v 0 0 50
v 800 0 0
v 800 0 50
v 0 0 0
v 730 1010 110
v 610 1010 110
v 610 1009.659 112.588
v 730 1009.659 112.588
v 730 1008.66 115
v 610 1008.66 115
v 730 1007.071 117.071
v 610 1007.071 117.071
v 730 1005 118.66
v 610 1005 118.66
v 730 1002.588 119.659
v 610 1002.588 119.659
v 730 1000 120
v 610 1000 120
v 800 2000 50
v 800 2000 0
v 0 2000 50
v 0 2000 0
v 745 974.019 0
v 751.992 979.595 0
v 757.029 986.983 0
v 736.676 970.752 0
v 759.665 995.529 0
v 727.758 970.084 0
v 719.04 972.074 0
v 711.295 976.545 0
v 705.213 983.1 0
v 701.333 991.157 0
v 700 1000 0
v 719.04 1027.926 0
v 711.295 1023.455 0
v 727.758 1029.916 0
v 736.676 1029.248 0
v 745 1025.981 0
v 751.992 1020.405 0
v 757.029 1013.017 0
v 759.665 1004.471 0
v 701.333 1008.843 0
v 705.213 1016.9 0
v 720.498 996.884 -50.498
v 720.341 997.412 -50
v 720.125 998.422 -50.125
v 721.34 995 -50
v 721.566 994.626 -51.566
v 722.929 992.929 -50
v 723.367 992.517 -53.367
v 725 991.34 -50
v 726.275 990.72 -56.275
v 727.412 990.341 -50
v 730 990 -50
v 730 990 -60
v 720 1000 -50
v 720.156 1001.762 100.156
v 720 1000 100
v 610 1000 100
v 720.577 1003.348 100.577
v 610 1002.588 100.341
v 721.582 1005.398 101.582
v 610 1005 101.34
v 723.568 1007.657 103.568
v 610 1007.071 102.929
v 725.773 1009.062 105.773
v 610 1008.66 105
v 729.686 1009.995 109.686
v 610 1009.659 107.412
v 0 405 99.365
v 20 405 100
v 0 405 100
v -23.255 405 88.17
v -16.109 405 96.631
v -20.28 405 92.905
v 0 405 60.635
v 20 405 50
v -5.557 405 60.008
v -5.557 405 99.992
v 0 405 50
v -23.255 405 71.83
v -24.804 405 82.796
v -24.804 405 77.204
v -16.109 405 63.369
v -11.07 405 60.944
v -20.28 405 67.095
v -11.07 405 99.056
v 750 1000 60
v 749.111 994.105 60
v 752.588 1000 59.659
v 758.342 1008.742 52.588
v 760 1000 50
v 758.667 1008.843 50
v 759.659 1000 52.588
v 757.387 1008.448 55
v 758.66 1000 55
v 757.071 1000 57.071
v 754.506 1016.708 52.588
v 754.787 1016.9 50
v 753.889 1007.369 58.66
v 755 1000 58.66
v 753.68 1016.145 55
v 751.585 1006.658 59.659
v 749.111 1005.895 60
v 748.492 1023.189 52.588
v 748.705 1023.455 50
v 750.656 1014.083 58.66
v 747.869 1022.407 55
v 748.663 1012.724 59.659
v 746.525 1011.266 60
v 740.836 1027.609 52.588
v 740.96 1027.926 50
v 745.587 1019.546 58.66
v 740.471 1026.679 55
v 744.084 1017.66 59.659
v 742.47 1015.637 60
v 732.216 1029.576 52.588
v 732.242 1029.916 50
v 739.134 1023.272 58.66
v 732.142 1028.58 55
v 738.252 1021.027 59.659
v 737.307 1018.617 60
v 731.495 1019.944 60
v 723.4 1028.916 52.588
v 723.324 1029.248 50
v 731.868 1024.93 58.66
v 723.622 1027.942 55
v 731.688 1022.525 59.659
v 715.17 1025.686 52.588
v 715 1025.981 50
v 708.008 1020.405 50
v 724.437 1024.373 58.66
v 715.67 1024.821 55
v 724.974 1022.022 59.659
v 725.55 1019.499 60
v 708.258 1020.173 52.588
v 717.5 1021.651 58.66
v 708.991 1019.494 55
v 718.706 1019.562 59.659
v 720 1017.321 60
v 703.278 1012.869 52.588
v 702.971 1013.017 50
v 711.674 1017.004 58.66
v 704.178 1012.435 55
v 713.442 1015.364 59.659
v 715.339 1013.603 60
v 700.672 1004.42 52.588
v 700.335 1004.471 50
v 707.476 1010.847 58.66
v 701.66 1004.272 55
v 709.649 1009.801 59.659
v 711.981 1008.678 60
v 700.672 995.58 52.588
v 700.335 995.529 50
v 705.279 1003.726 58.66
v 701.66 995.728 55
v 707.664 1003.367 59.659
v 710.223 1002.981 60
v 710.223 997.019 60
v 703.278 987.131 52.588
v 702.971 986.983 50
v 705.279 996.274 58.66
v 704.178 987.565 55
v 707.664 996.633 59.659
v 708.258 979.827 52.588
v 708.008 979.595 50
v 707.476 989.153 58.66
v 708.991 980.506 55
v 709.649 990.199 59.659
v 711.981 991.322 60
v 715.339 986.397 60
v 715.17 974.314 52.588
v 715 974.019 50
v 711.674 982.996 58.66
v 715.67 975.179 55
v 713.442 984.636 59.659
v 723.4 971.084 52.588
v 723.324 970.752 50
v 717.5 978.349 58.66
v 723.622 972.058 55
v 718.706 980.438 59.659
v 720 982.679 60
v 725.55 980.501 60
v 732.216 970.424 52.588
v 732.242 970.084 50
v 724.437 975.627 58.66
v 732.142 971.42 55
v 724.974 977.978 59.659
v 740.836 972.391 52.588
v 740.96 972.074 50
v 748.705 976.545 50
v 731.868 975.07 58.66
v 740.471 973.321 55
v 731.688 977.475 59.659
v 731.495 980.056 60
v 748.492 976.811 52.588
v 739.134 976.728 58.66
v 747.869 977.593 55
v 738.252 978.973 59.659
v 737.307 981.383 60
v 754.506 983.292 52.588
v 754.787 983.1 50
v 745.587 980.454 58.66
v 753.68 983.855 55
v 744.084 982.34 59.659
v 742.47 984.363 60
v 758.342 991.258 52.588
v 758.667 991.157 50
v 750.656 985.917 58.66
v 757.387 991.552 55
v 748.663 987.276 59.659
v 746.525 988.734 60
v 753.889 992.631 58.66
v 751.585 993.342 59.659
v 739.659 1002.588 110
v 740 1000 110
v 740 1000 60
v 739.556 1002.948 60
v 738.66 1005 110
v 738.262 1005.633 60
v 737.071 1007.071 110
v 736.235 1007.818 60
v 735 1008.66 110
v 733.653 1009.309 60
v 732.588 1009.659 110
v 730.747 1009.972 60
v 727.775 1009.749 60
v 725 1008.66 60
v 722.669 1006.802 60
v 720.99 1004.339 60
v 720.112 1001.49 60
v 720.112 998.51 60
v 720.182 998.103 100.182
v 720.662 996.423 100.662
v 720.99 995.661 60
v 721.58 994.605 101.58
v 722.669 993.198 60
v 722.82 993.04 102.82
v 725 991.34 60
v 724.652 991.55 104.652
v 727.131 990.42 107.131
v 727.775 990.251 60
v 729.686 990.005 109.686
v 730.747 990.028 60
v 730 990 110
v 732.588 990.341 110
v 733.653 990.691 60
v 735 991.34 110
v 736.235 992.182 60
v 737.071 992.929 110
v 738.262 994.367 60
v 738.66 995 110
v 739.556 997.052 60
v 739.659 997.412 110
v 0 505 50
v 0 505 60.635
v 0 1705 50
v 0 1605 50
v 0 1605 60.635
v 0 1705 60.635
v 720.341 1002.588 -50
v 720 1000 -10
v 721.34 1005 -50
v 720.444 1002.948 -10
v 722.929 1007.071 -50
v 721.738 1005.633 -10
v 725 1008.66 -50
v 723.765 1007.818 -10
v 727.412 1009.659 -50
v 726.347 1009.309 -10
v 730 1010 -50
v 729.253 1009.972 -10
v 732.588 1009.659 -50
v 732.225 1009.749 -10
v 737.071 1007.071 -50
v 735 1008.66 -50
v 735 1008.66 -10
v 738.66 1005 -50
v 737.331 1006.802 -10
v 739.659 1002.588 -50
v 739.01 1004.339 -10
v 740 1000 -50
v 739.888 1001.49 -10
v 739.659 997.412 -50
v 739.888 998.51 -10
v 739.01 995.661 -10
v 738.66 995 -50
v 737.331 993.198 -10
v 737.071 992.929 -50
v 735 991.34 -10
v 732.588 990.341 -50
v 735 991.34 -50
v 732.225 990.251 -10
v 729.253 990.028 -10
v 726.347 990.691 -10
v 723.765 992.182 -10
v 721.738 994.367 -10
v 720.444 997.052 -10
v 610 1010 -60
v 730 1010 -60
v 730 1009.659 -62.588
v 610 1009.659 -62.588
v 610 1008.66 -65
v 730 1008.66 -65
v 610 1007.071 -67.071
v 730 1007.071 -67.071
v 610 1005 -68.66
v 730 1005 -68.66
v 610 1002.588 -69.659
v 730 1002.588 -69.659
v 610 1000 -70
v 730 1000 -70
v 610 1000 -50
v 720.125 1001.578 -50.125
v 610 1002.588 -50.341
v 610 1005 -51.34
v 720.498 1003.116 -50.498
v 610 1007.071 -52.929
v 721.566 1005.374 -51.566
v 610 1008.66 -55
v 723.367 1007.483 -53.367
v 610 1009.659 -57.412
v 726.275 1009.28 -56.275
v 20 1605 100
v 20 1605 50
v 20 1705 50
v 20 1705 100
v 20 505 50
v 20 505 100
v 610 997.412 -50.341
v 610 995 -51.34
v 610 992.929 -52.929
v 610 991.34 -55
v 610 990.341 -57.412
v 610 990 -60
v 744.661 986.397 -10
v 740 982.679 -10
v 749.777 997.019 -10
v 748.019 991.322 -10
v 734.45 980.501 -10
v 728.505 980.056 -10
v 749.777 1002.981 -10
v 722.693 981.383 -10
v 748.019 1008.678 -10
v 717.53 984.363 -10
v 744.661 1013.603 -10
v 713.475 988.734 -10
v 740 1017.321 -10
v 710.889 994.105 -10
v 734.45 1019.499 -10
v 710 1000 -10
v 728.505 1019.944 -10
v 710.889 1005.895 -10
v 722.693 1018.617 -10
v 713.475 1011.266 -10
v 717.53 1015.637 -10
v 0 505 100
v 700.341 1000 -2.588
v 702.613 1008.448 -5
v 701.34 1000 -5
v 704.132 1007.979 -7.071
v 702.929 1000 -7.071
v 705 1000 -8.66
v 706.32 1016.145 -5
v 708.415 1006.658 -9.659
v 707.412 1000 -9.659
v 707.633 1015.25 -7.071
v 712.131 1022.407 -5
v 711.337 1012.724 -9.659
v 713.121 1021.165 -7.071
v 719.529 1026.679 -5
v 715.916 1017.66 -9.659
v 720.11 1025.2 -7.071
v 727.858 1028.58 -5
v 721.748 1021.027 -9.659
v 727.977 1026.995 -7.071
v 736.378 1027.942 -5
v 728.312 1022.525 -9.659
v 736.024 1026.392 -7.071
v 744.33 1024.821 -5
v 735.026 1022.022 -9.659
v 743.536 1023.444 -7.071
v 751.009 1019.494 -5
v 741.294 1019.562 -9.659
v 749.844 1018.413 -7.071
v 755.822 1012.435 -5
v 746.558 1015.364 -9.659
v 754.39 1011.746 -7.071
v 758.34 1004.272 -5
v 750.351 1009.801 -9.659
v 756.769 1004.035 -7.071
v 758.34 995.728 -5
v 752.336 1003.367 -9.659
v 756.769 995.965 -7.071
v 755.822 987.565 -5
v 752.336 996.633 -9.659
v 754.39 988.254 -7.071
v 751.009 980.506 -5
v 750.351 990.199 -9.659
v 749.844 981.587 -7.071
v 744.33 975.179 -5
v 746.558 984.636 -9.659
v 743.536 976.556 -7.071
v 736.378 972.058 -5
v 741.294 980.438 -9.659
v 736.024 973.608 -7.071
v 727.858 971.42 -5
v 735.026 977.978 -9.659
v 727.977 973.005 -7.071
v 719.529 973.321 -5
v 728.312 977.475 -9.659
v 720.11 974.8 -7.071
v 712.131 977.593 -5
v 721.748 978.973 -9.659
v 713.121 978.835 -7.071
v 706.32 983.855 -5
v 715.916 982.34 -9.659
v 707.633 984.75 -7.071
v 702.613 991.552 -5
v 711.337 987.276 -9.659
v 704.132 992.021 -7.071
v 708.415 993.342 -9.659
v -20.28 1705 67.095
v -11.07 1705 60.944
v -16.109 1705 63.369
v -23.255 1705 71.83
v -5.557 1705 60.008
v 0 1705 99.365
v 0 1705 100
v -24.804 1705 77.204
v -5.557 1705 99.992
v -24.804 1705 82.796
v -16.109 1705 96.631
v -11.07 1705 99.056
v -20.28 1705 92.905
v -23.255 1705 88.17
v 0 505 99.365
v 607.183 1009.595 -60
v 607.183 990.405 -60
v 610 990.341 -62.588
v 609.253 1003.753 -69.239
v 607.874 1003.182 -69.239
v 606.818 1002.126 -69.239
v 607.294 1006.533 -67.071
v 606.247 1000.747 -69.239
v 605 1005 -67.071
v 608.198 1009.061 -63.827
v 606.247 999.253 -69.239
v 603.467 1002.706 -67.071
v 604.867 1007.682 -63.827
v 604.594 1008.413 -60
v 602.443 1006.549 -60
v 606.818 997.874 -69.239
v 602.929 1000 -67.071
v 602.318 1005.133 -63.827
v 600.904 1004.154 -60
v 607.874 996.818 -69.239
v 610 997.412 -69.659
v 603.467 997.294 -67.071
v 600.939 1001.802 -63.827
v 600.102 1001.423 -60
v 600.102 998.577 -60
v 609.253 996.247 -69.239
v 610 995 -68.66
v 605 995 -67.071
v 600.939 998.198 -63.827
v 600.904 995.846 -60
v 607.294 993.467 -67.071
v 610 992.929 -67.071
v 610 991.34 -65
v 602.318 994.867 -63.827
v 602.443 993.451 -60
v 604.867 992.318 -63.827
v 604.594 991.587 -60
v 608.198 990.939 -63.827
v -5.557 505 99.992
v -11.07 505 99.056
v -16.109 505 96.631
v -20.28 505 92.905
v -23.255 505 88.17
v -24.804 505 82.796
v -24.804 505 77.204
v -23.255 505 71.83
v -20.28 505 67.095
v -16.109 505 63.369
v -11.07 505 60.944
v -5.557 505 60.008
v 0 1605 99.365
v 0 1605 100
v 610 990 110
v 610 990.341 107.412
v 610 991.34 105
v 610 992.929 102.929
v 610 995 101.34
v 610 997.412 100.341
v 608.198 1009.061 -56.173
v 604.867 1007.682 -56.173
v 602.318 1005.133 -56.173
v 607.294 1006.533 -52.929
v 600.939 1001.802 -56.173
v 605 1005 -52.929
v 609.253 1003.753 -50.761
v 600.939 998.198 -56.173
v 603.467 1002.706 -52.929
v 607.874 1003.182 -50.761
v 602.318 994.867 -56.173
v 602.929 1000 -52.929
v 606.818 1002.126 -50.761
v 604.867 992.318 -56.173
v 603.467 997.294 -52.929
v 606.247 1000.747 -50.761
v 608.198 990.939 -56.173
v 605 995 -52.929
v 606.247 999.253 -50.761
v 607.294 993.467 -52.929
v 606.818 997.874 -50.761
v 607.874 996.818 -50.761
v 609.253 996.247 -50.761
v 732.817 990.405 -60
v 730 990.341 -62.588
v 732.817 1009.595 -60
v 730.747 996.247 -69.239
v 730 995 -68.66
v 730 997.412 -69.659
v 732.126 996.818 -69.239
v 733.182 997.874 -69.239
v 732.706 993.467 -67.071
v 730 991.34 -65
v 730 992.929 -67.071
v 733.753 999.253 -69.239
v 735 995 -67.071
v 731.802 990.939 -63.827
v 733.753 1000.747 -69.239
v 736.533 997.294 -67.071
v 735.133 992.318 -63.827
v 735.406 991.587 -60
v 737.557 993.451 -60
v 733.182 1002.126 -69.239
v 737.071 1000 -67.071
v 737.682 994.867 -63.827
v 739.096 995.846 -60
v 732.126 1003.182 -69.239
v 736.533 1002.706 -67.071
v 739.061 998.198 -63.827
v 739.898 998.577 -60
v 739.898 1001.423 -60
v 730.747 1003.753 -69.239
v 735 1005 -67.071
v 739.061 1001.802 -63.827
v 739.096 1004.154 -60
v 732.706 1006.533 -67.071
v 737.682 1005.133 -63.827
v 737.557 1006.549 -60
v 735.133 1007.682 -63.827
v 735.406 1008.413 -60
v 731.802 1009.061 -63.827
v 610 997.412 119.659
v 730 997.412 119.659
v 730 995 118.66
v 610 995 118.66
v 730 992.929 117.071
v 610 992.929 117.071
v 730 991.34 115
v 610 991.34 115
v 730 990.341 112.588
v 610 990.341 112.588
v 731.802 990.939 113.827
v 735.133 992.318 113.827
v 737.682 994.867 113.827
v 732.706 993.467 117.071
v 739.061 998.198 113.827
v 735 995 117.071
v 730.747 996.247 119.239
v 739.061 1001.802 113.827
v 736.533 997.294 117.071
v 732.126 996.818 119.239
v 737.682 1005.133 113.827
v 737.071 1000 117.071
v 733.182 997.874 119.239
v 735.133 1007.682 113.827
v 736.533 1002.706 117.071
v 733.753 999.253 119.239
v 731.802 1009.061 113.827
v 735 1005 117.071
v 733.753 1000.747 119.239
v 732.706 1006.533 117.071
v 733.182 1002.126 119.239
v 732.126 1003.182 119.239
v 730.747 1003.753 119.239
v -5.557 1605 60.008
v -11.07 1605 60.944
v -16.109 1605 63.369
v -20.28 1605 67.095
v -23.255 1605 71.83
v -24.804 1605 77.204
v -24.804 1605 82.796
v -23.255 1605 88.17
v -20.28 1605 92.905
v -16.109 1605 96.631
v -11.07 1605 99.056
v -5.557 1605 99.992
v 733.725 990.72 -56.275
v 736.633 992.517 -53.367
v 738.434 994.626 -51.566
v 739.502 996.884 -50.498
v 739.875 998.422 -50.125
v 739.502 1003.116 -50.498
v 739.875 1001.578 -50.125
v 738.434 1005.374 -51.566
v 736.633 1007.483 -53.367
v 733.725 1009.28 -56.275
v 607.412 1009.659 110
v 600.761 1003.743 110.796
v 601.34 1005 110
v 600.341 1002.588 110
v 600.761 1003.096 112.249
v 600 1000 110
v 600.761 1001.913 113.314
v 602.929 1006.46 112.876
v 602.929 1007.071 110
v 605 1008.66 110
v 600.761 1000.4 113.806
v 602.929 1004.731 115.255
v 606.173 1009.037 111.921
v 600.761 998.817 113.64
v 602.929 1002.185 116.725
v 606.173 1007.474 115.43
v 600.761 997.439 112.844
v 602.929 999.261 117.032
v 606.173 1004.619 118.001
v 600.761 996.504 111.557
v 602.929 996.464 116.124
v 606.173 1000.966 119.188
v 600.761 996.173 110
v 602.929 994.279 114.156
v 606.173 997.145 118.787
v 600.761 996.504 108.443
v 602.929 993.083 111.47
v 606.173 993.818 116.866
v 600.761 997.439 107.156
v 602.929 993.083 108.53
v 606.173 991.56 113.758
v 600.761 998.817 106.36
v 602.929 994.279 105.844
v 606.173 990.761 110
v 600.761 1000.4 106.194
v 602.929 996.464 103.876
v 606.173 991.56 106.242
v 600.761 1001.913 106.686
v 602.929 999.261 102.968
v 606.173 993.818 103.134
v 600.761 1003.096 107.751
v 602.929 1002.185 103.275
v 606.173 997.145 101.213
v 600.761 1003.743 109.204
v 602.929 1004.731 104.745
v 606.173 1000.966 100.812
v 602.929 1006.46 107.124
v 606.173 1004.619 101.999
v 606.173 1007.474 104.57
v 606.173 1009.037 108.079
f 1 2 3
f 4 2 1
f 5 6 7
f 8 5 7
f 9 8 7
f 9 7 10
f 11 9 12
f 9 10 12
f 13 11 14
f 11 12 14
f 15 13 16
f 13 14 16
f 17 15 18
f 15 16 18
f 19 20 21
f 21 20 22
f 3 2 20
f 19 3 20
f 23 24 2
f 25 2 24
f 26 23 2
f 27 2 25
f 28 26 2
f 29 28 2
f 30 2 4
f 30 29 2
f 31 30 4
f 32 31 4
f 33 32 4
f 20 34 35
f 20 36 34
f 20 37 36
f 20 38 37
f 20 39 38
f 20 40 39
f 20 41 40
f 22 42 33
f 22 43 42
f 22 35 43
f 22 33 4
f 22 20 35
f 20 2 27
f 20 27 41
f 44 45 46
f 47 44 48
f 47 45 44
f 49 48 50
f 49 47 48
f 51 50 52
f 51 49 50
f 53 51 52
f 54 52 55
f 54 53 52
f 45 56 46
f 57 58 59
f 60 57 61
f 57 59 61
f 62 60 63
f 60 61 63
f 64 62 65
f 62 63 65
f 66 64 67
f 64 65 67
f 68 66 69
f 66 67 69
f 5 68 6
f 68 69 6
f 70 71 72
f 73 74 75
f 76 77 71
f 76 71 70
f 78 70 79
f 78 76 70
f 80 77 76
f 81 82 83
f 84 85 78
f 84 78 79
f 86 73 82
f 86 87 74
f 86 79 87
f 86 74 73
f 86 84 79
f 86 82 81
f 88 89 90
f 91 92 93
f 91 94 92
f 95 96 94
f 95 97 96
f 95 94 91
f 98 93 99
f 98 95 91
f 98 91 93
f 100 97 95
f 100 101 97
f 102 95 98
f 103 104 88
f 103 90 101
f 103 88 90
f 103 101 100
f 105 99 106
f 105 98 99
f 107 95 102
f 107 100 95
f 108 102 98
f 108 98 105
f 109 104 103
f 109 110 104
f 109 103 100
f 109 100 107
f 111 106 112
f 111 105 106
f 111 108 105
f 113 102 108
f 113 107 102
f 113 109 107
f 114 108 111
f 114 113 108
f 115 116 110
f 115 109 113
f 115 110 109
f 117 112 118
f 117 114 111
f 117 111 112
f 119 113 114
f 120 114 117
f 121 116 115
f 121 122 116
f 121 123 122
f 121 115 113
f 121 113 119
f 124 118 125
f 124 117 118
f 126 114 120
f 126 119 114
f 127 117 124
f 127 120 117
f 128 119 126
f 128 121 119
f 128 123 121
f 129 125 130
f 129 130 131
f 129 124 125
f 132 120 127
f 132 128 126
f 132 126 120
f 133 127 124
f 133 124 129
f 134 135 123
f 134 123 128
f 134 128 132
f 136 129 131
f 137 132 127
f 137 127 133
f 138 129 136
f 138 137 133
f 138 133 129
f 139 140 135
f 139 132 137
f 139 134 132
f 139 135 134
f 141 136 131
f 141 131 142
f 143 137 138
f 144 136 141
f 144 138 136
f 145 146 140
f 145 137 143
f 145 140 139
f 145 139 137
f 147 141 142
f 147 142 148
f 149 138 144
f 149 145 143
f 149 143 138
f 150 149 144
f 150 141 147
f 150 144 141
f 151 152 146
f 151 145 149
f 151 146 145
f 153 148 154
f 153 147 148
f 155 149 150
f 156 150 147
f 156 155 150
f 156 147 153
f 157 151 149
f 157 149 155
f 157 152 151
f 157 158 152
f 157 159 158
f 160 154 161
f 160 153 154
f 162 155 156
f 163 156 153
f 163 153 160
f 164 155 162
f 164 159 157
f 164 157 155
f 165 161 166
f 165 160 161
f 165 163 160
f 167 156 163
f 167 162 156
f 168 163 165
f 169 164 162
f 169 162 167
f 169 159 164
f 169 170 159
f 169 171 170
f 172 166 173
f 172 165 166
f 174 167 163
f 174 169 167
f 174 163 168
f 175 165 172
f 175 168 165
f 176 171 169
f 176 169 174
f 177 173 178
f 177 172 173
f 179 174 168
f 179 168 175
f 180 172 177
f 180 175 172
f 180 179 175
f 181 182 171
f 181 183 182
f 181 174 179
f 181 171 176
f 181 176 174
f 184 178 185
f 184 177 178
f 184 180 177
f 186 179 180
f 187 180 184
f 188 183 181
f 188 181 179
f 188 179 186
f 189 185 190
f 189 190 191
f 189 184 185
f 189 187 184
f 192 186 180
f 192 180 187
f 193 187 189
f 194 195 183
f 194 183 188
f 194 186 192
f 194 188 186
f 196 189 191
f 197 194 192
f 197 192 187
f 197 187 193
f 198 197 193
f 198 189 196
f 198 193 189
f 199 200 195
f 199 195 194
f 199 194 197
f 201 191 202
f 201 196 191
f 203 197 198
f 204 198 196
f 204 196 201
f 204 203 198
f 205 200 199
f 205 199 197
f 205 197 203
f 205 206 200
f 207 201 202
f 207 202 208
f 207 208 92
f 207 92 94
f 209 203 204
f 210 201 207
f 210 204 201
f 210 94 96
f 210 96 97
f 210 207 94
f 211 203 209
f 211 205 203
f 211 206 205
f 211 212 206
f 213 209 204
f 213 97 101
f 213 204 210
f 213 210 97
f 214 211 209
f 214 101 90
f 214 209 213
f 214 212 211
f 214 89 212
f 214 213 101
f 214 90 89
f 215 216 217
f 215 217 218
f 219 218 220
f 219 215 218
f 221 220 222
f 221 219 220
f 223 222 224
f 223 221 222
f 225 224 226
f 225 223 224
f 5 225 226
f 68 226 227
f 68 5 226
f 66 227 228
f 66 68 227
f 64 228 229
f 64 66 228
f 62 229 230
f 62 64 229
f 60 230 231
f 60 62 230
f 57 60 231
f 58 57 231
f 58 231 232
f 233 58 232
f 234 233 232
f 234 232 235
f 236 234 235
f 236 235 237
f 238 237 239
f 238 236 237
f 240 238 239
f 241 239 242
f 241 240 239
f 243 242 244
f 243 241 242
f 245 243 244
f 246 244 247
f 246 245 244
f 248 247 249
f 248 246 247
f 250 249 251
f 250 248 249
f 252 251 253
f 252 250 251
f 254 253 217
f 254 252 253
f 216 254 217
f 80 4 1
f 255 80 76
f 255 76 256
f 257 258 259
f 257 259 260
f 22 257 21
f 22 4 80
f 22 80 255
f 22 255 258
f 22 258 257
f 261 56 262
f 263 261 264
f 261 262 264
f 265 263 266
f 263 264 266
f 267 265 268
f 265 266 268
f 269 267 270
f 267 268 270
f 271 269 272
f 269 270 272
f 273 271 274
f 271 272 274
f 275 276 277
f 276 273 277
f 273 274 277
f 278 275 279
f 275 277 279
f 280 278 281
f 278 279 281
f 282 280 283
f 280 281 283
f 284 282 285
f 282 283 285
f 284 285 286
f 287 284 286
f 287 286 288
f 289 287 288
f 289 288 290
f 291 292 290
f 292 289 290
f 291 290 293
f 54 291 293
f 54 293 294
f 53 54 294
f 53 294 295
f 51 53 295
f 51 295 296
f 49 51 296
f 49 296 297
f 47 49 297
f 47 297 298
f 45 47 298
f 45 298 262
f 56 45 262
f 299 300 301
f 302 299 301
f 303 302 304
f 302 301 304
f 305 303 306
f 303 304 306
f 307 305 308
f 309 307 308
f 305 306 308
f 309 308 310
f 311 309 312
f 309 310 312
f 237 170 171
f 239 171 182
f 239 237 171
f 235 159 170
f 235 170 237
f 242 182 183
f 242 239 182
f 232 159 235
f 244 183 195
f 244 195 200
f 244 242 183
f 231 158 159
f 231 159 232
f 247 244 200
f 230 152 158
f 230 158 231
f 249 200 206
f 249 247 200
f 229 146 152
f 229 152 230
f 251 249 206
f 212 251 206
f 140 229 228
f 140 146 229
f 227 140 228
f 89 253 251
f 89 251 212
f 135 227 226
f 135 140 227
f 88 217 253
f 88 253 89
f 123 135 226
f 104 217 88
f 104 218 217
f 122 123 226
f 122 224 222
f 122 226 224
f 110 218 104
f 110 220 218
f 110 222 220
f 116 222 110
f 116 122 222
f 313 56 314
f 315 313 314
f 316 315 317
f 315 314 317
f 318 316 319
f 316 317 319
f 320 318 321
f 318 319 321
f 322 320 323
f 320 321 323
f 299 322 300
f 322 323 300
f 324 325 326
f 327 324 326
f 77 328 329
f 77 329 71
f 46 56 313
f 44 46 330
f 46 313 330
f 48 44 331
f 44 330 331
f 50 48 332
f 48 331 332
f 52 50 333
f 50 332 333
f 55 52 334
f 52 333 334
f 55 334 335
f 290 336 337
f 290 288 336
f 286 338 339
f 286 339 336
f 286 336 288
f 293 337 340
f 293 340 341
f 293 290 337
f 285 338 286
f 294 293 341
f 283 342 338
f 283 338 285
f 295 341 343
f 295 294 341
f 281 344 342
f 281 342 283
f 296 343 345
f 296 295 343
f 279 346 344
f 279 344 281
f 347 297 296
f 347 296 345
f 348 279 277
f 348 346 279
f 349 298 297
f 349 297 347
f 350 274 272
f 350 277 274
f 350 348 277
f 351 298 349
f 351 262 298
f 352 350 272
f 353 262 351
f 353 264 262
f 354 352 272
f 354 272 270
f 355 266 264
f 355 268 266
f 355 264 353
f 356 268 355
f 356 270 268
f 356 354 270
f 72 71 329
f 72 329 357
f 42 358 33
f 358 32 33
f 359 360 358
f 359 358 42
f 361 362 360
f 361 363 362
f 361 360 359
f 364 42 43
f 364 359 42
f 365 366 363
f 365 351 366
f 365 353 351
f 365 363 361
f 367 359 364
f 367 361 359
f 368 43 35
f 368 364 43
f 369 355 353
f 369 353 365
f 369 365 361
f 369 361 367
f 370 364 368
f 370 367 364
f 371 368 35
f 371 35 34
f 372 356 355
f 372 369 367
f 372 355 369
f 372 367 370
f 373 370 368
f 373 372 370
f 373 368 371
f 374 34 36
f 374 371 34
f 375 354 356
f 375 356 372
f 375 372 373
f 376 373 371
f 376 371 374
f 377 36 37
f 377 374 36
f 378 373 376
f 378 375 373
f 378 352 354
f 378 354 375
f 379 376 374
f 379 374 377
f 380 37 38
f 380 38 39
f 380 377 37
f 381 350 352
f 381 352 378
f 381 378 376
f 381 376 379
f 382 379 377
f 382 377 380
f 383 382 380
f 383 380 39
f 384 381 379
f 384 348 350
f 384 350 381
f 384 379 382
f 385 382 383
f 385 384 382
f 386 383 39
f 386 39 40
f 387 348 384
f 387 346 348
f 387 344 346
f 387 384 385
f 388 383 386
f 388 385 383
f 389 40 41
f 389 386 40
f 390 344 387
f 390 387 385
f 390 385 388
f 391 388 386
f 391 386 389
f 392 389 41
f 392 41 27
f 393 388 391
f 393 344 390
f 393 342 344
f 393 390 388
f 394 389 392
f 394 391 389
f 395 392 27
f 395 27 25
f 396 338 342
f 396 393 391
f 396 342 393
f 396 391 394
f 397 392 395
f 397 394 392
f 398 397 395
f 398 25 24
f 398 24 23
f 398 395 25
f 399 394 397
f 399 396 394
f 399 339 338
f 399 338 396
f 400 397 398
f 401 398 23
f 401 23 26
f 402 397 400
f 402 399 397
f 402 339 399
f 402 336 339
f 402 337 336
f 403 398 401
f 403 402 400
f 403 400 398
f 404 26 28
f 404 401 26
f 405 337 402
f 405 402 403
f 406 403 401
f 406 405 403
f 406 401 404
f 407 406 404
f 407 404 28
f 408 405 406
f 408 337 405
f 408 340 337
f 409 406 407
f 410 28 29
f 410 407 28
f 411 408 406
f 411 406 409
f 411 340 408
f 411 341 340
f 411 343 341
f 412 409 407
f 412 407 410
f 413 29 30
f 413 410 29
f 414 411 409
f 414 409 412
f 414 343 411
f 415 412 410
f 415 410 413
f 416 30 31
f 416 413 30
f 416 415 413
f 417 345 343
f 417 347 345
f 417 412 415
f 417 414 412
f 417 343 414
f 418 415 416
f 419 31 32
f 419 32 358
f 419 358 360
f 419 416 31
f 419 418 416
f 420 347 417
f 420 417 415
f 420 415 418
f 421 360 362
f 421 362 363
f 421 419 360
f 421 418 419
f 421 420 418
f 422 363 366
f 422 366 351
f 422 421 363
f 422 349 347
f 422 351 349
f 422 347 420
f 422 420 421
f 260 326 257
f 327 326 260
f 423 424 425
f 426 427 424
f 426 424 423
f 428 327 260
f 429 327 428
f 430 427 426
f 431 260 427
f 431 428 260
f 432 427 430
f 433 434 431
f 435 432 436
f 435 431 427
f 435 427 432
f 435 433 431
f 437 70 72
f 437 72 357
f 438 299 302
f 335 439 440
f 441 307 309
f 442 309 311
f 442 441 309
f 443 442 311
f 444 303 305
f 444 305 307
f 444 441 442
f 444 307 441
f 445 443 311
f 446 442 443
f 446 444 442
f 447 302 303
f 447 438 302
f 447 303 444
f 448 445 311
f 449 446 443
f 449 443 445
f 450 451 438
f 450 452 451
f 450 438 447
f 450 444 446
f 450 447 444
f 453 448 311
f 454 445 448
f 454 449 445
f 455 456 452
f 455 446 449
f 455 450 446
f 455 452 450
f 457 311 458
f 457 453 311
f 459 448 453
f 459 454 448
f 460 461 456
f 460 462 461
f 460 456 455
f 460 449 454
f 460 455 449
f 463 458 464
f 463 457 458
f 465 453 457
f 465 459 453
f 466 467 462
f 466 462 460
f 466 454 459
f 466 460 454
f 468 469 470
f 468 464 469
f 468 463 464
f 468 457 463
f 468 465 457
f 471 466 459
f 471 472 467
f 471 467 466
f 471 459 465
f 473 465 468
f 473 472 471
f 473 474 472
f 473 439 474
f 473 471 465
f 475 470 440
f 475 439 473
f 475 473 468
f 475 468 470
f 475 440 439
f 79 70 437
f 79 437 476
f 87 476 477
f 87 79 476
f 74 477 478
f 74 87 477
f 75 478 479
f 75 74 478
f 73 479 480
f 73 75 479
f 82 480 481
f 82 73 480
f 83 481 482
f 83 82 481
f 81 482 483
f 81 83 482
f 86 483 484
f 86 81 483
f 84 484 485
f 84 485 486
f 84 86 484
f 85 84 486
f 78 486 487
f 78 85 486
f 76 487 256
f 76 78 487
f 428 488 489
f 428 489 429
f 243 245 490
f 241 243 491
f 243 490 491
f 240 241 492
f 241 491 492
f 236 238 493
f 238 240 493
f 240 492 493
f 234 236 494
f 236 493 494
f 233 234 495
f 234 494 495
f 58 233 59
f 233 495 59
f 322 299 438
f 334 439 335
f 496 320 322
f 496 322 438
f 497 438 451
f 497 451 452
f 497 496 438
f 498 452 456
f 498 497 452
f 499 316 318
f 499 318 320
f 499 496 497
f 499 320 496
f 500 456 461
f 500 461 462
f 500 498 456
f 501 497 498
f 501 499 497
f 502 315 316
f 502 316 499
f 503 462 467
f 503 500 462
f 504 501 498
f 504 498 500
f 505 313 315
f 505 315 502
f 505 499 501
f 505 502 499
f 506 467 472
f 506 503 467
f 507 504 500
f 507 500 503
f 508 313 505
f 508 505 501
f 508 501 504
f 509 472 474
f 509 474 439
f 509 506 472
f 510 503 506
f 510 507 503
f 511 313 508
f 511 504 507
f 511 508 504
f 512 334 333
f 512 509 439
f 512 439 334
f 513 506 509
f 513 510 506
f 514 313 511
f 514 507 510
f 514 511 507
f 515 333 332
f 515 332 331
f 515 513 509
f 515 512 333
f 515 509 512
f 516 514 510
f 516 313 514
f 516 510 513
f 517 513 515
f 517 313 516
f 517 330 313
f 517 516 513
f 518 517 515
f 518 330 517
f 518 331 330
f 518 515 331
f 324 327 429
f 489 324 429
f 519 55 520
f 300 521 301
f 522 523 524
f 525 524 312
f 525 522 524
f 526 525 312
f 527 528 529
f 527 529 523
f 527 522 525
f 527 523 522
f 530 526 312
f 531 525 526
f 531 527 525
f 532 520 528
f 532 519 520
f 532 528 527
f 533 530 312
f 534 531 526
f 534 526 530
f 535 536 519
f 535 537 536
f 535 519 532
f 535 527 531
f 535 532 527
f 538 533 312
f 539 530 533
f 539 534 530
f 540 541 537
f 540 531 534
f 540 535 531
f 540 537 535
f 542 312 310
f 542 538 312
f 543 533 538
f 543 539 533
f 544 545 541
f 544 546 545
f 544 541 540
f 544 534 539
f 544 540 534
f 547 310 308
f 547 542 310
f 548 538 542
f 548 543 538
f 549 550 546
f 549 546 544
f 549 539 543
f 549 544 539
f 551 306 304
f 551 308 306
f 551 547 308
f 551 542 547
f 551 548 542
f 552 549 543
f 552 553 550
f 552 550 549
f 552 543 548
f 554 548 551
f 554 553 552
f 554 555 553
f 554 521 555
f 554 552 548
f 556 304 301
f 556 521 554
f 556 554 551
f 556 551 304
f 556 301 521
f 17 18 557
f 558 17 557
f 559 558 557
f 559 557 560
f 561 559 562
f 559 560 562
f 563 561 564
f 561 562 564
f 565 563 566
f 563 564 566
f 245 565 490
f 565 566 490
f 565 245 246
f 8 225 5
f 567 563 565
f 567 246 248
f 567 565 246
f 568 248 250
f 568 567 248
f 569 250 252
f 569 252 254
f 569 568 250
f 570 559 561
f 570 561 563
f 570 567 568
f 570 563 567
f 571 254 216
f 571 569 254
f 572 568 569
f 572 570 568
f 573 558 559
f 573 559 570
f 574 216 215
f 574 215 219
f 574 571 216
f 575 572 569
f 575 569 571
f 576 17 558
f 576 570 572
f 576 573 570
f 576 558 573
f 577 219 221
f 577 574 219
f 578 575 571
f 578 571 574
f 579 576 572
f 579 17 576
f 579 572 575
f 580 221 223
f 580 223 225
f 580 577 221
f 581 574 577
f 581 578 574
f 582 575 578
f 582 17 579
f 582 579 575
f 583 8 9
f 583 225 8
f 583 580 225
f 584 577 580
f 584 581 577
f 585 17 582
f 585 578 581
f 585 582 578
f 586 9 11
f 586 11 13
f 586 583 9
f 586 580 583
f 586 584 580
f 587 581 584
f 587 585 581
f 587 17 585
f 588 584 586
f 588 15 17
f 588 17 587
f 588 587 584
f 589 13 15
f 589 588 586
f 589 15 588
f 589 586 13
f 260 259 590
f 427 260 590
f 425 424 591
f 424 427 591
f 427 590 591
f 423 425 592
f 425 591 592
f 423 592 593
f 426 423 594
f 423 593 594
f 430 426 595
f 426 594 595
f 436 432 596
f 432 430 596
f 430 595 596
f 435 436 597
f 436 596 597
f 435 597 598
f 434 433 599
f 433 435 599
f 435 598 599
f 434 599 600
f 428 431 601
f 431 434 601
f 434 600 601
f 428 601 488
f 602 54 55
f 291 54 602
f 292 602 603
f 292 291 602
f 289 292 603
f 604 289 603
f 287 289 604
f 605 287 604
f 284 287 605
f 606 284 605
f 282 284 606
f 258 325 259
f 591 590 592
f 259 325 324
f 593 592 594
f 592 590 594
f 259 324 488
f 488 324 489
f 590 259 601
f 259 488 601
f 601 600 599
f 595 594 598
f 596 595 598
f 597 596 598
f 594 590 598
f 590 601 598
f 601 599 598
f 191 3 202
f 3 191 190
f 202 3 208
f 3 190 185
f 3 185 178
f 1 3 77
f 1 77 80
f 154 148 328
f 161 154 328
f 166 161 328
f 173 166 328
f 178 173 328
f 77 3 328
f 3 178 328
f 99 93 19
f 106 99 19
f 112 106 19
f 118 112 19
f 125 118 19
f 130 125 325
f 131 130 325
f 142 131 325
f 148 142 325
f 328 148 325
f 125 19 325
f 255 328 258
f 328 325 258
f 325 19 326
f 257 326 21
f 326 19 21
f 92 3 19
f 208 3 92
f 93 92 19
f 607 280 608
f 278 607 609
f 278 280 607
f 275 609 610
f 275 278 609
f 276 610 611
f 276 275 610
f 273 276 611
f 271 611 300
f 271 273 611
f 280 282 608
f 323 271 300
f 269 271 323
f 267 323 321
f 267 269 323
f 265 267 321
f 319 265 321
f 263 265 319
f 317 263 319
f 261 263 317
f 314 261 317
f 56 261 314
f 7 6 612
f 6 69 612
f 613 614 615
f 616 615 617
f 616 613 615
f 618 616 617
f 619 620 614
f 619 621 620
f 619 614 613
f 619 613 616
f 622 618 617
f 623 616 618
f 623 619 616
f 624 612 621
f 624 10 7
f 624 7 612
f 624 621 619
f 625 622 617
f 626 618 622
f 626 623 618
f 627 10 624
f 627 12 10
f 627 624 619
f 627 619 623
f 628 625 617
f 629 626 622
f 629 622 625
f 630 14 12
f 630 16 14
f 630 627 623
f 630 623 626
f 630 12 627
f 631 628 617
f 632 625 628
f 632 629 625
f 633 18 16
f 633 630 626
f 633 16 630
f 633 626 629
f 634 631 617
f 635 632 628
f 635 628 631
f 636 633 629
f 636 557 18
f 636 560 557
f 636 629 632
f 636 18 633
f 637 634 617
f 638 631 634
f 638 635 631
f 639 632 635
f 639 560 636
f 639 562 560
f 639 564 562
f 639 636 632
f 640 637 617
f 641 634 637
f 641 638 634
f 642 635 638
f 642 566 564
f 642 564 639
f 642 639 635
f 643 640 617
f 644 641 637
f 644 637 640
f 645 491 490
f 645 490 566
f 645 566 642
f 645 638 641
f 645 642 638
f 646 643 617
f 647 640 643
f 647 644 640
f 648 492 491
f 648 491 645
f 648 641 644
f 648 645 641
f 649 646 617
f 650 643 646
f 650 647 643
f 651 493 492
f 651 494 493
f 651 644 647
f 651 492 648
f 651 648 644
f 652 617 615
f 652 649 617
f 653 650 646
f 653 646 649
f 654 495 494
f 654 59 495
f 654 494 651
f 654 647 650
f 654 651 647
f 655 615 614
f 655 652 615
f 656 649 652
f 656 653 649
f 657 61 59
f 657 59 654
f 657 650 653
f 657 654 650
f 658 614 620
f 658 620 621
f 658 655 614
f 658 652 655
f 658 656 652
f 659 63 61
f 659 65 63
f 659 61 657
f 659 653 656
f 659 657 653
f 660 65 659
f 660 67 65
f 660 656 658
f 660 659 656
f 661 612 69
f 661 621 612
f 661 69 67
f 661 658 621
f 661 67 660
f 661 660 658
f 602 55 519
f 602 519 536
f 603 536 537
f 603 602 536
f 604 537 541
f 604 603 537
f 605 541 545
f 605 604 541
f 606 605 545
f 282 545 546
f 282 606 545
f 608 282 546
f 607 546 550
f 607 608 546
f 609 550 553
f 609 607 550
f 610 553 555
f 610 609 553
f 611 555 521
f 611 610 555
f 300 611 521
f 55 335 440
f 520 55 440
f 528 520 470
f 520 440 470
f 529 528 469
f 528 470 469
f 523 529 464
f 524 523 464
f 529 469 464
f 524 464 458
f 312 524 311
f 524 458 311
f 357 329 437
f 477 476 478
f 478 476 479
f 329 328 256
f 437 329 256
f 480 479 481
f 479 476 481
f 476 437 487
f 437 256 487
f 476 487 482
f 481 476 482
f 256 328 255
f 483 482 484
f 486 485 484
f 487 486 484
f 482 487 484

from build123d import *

# Parameters (mm, degrees)
SKETCH_1_W               = 800
SKETCH_1_H               = 2000
EXTRUDE_1_DEPTH          = 50
SKETCH_2_W               = 20
SKETCH_2_H               = 100
EXTRUDE_2_DEPTH          = 50
SKETCH_3_R               = 20
EXTRUDE_3_DEPTH          = 100
PATTERN_LINEAR_1_COUNT   = 2
PATTERN_LINEAR_1_PITCH   = 1200
SKETCH_4_R               = 30
EXTRUDE_4_DEPTH          = 10
SKETCH_5_R               = 10
EXTRUDE_5_DEPTH          = 40
EXTRUDE_6_DEPTH          = 20
FILLET_1_R               = 10
MIRROR_START             = 610
MIRROR_1_DEPTH           = 120
MIRROR_2_COPY_1_SKETCH_W = 20
MIRROR_2_COPY_1_SKETCH_H = 100
MIRROR_2_COPY_1_DEPTH    = 50
MIRROR_2_COPY_2_SKETCH_R = 20
MIRROR_2_COPY_2_DEPTH    = 100
DELETE_START             = 405
DELETE_FACE_1_DEPTH      = 1300


with BuildPart() as part:
    # Эскиз1 → Бобышка-Вытянуть1 (new body)
    with BuildSketch(Plane(origin=(46095.73955041, 0, 0), x_dir=(-1, 0, 0), z_dir=(0, 0, -1))):
        with Locations((45695.73955041, 1000)):
            Rectangle(SKETCH_1_W, SKETCH_1_H)
    extrude(amount=-EXTRUDE_1_DEPTH)

    # Эскиз2 → Бобышка-Вытянуть2 (add)
    with BuildSketch(Plane(origin=(0, 0, 0), x_dir=(-1, 0, 0), z_dir=(0, 0, -1))):
        with Locations((-10, 1655)):
            Rectangle(SKETCH_2_W, SKETCH_2_H)
    extrude_2 = extrude(amount=EXTRUDE_2_DEPTH)

    # Эскиз3 → Бобышка-Вытянуть3 (add)
    with BuildSketch(Plane(origin=(0, 1605, 0), x_dir=(-1, 0, 0), z_dir=(0, -1, 0))):
        with Locations((5, 30)):
            Circle(SKETCH_3_R)
    extrude_3 = extrude(amount=-EXTRUDE_3_DEPTH)

    # Линейный массив1: Бобышка-Вытянуть2, Бобышка-Вытянуть3 ×2
    with Locations(*[(0, -i * PATTERN_LINEAR_1_PITCH, 0) for i in range(1, PATTERN_LINEAR_1_COUNT)]):
        add(extrude_2)
        add(extrude_3)

    # Эскиз4 → Бобышка-Вытянуть4 (add)
    with BuildSketch(Plane(origin=(0, 0, 0), x_dir=(-1, 0, 0), z_dir=(0, 0, -1))):
        with Locations((-730, 1000)):
            Circle(SKETCH_4_R)
    extrude(amount=EXTRUDE_4_DEPTH)

    # Эскиз5 → Бобышка-Вытянуть5 (add)
    with BuildSketch(Plane(origin=(0, 0, -10), x_dir=(-1, 0, 0), z_dir=(0, 0, -1))):
        with Locations((-730, 1000)):
            Circle(SKETCH_5_R)
    extrude(amount=EXTRUDE_5_DEPTH)

    # Эскиз6 → Бобышка-Вытянуть6 (add)
    with BuildSketch(Plane(origin=(0, 0, -50), x_dir=(-1, 0, 0), z_dir=(0, 0, -1))):
        with BuildLine():
            Line((-730, 1010), (-610, 1010))
            ThreePointArc((-610, 1010), (-600, 1000), (-610, 990))
            Line((-610, 990), (-730, 990))
            ThreePointArc((-730, 990), (-740, 1000), (-730, 1010))
        make_face()
    extrude(amount=EXTRUDE_6_DEPTH)

    # Скругление1
    # the kernel refuses this fillet: 10 mm, written as the material it takes off along each edge
    with BuildSketch(Plane(origin=(755, 1010, -50), x_dir=(0, -1, 0), z_dir=(-1, 0, 0))) as fillet_1_piece_1_section:
        with BuildLine():
            CenterArc((FILLET_1_R, -FILLET_1_R), FILLET_1_R, 90, 90)
            Line((0, -FILLET_1_R), (0, 0))
            Line((0, 0), (FILLET_1_R, 0))
        make_face()
    fillet_1_piece_1 = extrude(amount=145, mode=Mode.PRIVATE)
    fillet_1_piece_1 = fillet_1_piece_1 - Plane(origin=(730, 1000, -50), x_dir=(-1, 0, 0), z_dir=(0, 0, 1)) * Cylinder(10, 330, mode=Mode.PRIVATE)
    add(fillet_1_piece_1, mode=Mode.SUBTRACT)
    with BuildSketch(Plane(origin=(610, 1000, -50), x_dir=(0, 1, 0), z_dir=(1, 0, 0))) as fillet_1_piece_2:
        with BuildLine():
            CenterArc((10 - FILLET_1_R, -FILLET_1_R), FILLET_1_R, 0, 90)
            Line((10, -FILLET_1_R), (10, 0))
            Line((10, 0), (10 - FILLET_1_R, 0))
        make_face()
    revolve(axis=Axis((610, 1000, -50), (0, 0, 1)), revolution_arc=180, mode=Mode.SUBTRACT)
    with BuildSketch(Plane(origin=(730, 1010, -70), x_dir=(0, 0, 1), z_dir=(-1, 0, 0)), Plane(origin=(610, 990, -70), x_dir=(0, 0, 1), z_dir=(1, 0, 0))) as fillet_1_piece_3:
        with BuildLine():
            CenterArc((FILLET_1_R, -FILLET_1_R), FILLET_1_R, 90, 90)
            Line((0, -FILLET_1_R), (0, 0))
            Line((0, 0), (FILLET_1_R, 0))
        make_face()
    extrude(amount=120, mode=Mode.SUBTRACT)
    with BuildSketch(Plane(origin=(610, 1000, -70), x_dir=(0, 1, 0), z_dir=(1, 0, 0))) as fillet_1_piece_4:
        with BuildLine():
            CenterArc((10 - FILLET_1_R, FILLET_1_R), FILLET_1_R, 270, 90)
            Line((10 - FILLET_1_R, 0), (10, 0))
            Line((10, 0), (10, FILLET_1_R))
        make_face()
    revolve(axis=Axis((610, 1000, -70), (0, 0, 1)), revolution_arc=180, mode=Mode.SUBTRACT)
    with BuildSketch(Plane(origin=(730, 1000, -70), x_dir=(0, -1, 0), z_dir=(-1, 0, 0))) as fillet_1_piece_5:
        with BuildLine():
            CenterArc((10 - FILLET_1_R, FILLET_1_R), FILLET_1_R, 270, 90)
            Line((10 - FILLET_1_R, 0), (10, 0))
            Line((10, 0), (10, FILLET_1_R))
        make_face()
    revolve(axis=Axis((730, 1000, -70), (0, 0, 1)), revolution_arc=180, mode=Mode.SUBTRACT)
    with BuildSketch(Plane(origin=(730, 1000, -10), x_dir=(-1, 0, 0), z_dir=(0, -1, 0))) as fillet_1_piece_6:
        with BuildLine():
            CenterArc((30 - FILLET_1_R, -FILLET_1_R), FILLET_1_R, 0, 90)
            Line((30 - FILLET_1_R, 0), (30, 0))
            Line((30, 0), (30, -FILLET_1_R))
        make_face()
    revolve(axis=Axis((730, 1000, -10), (0, 0, -1)), mode=Mode.SUBTRACT)
    with BuildSketch(Plane(origin=(610, 990, -50), x_dir=(0, 1, 0), z_dir=(1, 0, 0))) as fillet_1_piece_7_section:
        with BuildLine():
            CenterArc((FILLET_1_R, -FILLET_1_R), FILLET_1_R, 90, 90)
            Line((0, -FILLET_1_R), (0, 0))
            Line((0, 0), (FILLET_1_R, 0))
        make_face()
    fillet_1_piece_7 = extrude(amount=145, mode=Mode.PRIVATE)
    fillet_1_piece_7 = fillet_1_piece_7 - Plane(origin=(730, 1000, -50), x_dir=(-1, 0, 0), z_dir=(0, 0, 1)) * Cylinder(10, 330, mode=Mode.PRIVATE)
    add(fillet_1_piece_7, mode=Mode.SUBTRACT)



with BuildPart() as body_2:
    # Зеркальное отражение1: read off the stored shape, not the designer's step
    # Зеркальное отражение1 outline → Зеркальное отражение1 (new body)
    with BuildSketch(Plane.YZ.offset(MIRROR_START)):
        with BuildLine():
            ThreePointArc((1000, 120), (992.928932188, 117.071067812), (990, 110))
            ThreePointArc((990, 110), (992.928932188, 102.928932188), (1000, 100))
            ThreePointArc((1000, 100), (1007.071067812, 102.928932188), (1010, 110))
            ThreePointArc((1010, 110), (1007.071067812, 117.071067812), (1000, 120))
        make_face()
    extrude(amount=MIRROR_1_DEPTH)


with BuildPart() as part_1:
    add(part.part)

    add(body_2.part)  # Mirror 1 2 merges body 2
    # Mirror 1 2 outline → Mirror 1 2 (revolve)
    with BuildSketch(Plane(origin=(730, 1000, 0), x_dir=(1, 0, 0), z_dir=(0, -1, 0))):
        with BuildLine():
            Line((10, 60), (10, 110))
            ThreePointArc((10, 110), (7.071067812, 117.071067812), (0, 120))
            Line((0, 120), (0, 50))
            Line((0, 50), (30, 50))
            ThreePointArc((30, 50), (27.071067812, 57.071067812), (20, 60))
            Line((20, 60), (10, 60))
        make_face()
    revolve(axis=Axis((730, 1000, 0), (0, 0, 1)))

    # Mirror 1 3 outline → Mirror 1 3 (revolve)
    with BuildSketch(Plane(origin=(0, 1000, 110), x_dir=(0, 1, 0), z_dir=(0, 0, -1))):
        with BuildLine():
            Line((0, 610), (0, 600))
            ThreePointArc((0, 600), (7.071067812, 602.928932188), (10, 610))
            Line((10, 610), (0, 610))
        make_face()
    revolve(axis=Axis((0, 1000, 110), (1, 0, 0)))

    # Зеркальное отражение2: Бобышка-Вытянуть2, Бобышка-Вытянуть3 across plane
    add(extrude_2.mirror(Plane(origin=(0, 0, 25), x_dir=(1, 0, 0), z_dir=(0, 0, -1))))
    add(extrude_3.mirror(Plane(origin=(0, 0, 25), x_dir=(1, 0, 0), z_dir=(0, 0, -1))))

    # Зеркальное отражение2 copy 1 sketch → Зеркальное отражение2 copy 1 (add)
    with BuildSketch(Plane(origin=(0, -1200, 50), x_dir=(-1, 0, 0), z_dir=(0, 0, 1))):
        with Locations((-10, -1655)):
            Rectangle(MIRROR_2_COPY_1_SKETCH_W, MIRROR_2_COPY_1_SKETCH_H)
    extrude(amount=MIRROR_2_COPY_1_DEPTH)

    # Зеркальное отражение2 copy 2 sketch → Зеркальное отражение2 copy 2 (add)
    with BuildSketch(Plane(origin=(0, 405, 50), x_dir=(-1, 0, 0), z_dir=(0, -1, 0))):
        with Locations((5, -30)):
            Circle(MIRROR_2_COPY_2_SKETCH_R)
    extrude(amount=-MIRROR_2_COPY_2_DEPTH)

    # Delete Face 1: read off the stored shape, not the designer's step
    # Delete Face 1 outline → Delete Face 1 (cut)
    with BuildSketch(Plane(origin=(0, 0, 0), x_dir=(1, 0, 0), z_dir=(0, 1, 0)).offset(DELETE_START)):
        with BuildLine():
            Line((20, 50), (0, 50))
            Line((0, 50), (0, 49.364916731))
            ThreePointArc((0, 49.364916731), (-25, 30), (0, 10.635083269))
            Line((0, 10.635083269), (0, 0))
            Line((0, 0), (20, 0))
            Line((20, 0), (20, 50))
        make_face()
    extrude(amount=DELETE_FACE_1_DEPTH, mode=Mode.SUBTRACT)


solid = part_1.part
